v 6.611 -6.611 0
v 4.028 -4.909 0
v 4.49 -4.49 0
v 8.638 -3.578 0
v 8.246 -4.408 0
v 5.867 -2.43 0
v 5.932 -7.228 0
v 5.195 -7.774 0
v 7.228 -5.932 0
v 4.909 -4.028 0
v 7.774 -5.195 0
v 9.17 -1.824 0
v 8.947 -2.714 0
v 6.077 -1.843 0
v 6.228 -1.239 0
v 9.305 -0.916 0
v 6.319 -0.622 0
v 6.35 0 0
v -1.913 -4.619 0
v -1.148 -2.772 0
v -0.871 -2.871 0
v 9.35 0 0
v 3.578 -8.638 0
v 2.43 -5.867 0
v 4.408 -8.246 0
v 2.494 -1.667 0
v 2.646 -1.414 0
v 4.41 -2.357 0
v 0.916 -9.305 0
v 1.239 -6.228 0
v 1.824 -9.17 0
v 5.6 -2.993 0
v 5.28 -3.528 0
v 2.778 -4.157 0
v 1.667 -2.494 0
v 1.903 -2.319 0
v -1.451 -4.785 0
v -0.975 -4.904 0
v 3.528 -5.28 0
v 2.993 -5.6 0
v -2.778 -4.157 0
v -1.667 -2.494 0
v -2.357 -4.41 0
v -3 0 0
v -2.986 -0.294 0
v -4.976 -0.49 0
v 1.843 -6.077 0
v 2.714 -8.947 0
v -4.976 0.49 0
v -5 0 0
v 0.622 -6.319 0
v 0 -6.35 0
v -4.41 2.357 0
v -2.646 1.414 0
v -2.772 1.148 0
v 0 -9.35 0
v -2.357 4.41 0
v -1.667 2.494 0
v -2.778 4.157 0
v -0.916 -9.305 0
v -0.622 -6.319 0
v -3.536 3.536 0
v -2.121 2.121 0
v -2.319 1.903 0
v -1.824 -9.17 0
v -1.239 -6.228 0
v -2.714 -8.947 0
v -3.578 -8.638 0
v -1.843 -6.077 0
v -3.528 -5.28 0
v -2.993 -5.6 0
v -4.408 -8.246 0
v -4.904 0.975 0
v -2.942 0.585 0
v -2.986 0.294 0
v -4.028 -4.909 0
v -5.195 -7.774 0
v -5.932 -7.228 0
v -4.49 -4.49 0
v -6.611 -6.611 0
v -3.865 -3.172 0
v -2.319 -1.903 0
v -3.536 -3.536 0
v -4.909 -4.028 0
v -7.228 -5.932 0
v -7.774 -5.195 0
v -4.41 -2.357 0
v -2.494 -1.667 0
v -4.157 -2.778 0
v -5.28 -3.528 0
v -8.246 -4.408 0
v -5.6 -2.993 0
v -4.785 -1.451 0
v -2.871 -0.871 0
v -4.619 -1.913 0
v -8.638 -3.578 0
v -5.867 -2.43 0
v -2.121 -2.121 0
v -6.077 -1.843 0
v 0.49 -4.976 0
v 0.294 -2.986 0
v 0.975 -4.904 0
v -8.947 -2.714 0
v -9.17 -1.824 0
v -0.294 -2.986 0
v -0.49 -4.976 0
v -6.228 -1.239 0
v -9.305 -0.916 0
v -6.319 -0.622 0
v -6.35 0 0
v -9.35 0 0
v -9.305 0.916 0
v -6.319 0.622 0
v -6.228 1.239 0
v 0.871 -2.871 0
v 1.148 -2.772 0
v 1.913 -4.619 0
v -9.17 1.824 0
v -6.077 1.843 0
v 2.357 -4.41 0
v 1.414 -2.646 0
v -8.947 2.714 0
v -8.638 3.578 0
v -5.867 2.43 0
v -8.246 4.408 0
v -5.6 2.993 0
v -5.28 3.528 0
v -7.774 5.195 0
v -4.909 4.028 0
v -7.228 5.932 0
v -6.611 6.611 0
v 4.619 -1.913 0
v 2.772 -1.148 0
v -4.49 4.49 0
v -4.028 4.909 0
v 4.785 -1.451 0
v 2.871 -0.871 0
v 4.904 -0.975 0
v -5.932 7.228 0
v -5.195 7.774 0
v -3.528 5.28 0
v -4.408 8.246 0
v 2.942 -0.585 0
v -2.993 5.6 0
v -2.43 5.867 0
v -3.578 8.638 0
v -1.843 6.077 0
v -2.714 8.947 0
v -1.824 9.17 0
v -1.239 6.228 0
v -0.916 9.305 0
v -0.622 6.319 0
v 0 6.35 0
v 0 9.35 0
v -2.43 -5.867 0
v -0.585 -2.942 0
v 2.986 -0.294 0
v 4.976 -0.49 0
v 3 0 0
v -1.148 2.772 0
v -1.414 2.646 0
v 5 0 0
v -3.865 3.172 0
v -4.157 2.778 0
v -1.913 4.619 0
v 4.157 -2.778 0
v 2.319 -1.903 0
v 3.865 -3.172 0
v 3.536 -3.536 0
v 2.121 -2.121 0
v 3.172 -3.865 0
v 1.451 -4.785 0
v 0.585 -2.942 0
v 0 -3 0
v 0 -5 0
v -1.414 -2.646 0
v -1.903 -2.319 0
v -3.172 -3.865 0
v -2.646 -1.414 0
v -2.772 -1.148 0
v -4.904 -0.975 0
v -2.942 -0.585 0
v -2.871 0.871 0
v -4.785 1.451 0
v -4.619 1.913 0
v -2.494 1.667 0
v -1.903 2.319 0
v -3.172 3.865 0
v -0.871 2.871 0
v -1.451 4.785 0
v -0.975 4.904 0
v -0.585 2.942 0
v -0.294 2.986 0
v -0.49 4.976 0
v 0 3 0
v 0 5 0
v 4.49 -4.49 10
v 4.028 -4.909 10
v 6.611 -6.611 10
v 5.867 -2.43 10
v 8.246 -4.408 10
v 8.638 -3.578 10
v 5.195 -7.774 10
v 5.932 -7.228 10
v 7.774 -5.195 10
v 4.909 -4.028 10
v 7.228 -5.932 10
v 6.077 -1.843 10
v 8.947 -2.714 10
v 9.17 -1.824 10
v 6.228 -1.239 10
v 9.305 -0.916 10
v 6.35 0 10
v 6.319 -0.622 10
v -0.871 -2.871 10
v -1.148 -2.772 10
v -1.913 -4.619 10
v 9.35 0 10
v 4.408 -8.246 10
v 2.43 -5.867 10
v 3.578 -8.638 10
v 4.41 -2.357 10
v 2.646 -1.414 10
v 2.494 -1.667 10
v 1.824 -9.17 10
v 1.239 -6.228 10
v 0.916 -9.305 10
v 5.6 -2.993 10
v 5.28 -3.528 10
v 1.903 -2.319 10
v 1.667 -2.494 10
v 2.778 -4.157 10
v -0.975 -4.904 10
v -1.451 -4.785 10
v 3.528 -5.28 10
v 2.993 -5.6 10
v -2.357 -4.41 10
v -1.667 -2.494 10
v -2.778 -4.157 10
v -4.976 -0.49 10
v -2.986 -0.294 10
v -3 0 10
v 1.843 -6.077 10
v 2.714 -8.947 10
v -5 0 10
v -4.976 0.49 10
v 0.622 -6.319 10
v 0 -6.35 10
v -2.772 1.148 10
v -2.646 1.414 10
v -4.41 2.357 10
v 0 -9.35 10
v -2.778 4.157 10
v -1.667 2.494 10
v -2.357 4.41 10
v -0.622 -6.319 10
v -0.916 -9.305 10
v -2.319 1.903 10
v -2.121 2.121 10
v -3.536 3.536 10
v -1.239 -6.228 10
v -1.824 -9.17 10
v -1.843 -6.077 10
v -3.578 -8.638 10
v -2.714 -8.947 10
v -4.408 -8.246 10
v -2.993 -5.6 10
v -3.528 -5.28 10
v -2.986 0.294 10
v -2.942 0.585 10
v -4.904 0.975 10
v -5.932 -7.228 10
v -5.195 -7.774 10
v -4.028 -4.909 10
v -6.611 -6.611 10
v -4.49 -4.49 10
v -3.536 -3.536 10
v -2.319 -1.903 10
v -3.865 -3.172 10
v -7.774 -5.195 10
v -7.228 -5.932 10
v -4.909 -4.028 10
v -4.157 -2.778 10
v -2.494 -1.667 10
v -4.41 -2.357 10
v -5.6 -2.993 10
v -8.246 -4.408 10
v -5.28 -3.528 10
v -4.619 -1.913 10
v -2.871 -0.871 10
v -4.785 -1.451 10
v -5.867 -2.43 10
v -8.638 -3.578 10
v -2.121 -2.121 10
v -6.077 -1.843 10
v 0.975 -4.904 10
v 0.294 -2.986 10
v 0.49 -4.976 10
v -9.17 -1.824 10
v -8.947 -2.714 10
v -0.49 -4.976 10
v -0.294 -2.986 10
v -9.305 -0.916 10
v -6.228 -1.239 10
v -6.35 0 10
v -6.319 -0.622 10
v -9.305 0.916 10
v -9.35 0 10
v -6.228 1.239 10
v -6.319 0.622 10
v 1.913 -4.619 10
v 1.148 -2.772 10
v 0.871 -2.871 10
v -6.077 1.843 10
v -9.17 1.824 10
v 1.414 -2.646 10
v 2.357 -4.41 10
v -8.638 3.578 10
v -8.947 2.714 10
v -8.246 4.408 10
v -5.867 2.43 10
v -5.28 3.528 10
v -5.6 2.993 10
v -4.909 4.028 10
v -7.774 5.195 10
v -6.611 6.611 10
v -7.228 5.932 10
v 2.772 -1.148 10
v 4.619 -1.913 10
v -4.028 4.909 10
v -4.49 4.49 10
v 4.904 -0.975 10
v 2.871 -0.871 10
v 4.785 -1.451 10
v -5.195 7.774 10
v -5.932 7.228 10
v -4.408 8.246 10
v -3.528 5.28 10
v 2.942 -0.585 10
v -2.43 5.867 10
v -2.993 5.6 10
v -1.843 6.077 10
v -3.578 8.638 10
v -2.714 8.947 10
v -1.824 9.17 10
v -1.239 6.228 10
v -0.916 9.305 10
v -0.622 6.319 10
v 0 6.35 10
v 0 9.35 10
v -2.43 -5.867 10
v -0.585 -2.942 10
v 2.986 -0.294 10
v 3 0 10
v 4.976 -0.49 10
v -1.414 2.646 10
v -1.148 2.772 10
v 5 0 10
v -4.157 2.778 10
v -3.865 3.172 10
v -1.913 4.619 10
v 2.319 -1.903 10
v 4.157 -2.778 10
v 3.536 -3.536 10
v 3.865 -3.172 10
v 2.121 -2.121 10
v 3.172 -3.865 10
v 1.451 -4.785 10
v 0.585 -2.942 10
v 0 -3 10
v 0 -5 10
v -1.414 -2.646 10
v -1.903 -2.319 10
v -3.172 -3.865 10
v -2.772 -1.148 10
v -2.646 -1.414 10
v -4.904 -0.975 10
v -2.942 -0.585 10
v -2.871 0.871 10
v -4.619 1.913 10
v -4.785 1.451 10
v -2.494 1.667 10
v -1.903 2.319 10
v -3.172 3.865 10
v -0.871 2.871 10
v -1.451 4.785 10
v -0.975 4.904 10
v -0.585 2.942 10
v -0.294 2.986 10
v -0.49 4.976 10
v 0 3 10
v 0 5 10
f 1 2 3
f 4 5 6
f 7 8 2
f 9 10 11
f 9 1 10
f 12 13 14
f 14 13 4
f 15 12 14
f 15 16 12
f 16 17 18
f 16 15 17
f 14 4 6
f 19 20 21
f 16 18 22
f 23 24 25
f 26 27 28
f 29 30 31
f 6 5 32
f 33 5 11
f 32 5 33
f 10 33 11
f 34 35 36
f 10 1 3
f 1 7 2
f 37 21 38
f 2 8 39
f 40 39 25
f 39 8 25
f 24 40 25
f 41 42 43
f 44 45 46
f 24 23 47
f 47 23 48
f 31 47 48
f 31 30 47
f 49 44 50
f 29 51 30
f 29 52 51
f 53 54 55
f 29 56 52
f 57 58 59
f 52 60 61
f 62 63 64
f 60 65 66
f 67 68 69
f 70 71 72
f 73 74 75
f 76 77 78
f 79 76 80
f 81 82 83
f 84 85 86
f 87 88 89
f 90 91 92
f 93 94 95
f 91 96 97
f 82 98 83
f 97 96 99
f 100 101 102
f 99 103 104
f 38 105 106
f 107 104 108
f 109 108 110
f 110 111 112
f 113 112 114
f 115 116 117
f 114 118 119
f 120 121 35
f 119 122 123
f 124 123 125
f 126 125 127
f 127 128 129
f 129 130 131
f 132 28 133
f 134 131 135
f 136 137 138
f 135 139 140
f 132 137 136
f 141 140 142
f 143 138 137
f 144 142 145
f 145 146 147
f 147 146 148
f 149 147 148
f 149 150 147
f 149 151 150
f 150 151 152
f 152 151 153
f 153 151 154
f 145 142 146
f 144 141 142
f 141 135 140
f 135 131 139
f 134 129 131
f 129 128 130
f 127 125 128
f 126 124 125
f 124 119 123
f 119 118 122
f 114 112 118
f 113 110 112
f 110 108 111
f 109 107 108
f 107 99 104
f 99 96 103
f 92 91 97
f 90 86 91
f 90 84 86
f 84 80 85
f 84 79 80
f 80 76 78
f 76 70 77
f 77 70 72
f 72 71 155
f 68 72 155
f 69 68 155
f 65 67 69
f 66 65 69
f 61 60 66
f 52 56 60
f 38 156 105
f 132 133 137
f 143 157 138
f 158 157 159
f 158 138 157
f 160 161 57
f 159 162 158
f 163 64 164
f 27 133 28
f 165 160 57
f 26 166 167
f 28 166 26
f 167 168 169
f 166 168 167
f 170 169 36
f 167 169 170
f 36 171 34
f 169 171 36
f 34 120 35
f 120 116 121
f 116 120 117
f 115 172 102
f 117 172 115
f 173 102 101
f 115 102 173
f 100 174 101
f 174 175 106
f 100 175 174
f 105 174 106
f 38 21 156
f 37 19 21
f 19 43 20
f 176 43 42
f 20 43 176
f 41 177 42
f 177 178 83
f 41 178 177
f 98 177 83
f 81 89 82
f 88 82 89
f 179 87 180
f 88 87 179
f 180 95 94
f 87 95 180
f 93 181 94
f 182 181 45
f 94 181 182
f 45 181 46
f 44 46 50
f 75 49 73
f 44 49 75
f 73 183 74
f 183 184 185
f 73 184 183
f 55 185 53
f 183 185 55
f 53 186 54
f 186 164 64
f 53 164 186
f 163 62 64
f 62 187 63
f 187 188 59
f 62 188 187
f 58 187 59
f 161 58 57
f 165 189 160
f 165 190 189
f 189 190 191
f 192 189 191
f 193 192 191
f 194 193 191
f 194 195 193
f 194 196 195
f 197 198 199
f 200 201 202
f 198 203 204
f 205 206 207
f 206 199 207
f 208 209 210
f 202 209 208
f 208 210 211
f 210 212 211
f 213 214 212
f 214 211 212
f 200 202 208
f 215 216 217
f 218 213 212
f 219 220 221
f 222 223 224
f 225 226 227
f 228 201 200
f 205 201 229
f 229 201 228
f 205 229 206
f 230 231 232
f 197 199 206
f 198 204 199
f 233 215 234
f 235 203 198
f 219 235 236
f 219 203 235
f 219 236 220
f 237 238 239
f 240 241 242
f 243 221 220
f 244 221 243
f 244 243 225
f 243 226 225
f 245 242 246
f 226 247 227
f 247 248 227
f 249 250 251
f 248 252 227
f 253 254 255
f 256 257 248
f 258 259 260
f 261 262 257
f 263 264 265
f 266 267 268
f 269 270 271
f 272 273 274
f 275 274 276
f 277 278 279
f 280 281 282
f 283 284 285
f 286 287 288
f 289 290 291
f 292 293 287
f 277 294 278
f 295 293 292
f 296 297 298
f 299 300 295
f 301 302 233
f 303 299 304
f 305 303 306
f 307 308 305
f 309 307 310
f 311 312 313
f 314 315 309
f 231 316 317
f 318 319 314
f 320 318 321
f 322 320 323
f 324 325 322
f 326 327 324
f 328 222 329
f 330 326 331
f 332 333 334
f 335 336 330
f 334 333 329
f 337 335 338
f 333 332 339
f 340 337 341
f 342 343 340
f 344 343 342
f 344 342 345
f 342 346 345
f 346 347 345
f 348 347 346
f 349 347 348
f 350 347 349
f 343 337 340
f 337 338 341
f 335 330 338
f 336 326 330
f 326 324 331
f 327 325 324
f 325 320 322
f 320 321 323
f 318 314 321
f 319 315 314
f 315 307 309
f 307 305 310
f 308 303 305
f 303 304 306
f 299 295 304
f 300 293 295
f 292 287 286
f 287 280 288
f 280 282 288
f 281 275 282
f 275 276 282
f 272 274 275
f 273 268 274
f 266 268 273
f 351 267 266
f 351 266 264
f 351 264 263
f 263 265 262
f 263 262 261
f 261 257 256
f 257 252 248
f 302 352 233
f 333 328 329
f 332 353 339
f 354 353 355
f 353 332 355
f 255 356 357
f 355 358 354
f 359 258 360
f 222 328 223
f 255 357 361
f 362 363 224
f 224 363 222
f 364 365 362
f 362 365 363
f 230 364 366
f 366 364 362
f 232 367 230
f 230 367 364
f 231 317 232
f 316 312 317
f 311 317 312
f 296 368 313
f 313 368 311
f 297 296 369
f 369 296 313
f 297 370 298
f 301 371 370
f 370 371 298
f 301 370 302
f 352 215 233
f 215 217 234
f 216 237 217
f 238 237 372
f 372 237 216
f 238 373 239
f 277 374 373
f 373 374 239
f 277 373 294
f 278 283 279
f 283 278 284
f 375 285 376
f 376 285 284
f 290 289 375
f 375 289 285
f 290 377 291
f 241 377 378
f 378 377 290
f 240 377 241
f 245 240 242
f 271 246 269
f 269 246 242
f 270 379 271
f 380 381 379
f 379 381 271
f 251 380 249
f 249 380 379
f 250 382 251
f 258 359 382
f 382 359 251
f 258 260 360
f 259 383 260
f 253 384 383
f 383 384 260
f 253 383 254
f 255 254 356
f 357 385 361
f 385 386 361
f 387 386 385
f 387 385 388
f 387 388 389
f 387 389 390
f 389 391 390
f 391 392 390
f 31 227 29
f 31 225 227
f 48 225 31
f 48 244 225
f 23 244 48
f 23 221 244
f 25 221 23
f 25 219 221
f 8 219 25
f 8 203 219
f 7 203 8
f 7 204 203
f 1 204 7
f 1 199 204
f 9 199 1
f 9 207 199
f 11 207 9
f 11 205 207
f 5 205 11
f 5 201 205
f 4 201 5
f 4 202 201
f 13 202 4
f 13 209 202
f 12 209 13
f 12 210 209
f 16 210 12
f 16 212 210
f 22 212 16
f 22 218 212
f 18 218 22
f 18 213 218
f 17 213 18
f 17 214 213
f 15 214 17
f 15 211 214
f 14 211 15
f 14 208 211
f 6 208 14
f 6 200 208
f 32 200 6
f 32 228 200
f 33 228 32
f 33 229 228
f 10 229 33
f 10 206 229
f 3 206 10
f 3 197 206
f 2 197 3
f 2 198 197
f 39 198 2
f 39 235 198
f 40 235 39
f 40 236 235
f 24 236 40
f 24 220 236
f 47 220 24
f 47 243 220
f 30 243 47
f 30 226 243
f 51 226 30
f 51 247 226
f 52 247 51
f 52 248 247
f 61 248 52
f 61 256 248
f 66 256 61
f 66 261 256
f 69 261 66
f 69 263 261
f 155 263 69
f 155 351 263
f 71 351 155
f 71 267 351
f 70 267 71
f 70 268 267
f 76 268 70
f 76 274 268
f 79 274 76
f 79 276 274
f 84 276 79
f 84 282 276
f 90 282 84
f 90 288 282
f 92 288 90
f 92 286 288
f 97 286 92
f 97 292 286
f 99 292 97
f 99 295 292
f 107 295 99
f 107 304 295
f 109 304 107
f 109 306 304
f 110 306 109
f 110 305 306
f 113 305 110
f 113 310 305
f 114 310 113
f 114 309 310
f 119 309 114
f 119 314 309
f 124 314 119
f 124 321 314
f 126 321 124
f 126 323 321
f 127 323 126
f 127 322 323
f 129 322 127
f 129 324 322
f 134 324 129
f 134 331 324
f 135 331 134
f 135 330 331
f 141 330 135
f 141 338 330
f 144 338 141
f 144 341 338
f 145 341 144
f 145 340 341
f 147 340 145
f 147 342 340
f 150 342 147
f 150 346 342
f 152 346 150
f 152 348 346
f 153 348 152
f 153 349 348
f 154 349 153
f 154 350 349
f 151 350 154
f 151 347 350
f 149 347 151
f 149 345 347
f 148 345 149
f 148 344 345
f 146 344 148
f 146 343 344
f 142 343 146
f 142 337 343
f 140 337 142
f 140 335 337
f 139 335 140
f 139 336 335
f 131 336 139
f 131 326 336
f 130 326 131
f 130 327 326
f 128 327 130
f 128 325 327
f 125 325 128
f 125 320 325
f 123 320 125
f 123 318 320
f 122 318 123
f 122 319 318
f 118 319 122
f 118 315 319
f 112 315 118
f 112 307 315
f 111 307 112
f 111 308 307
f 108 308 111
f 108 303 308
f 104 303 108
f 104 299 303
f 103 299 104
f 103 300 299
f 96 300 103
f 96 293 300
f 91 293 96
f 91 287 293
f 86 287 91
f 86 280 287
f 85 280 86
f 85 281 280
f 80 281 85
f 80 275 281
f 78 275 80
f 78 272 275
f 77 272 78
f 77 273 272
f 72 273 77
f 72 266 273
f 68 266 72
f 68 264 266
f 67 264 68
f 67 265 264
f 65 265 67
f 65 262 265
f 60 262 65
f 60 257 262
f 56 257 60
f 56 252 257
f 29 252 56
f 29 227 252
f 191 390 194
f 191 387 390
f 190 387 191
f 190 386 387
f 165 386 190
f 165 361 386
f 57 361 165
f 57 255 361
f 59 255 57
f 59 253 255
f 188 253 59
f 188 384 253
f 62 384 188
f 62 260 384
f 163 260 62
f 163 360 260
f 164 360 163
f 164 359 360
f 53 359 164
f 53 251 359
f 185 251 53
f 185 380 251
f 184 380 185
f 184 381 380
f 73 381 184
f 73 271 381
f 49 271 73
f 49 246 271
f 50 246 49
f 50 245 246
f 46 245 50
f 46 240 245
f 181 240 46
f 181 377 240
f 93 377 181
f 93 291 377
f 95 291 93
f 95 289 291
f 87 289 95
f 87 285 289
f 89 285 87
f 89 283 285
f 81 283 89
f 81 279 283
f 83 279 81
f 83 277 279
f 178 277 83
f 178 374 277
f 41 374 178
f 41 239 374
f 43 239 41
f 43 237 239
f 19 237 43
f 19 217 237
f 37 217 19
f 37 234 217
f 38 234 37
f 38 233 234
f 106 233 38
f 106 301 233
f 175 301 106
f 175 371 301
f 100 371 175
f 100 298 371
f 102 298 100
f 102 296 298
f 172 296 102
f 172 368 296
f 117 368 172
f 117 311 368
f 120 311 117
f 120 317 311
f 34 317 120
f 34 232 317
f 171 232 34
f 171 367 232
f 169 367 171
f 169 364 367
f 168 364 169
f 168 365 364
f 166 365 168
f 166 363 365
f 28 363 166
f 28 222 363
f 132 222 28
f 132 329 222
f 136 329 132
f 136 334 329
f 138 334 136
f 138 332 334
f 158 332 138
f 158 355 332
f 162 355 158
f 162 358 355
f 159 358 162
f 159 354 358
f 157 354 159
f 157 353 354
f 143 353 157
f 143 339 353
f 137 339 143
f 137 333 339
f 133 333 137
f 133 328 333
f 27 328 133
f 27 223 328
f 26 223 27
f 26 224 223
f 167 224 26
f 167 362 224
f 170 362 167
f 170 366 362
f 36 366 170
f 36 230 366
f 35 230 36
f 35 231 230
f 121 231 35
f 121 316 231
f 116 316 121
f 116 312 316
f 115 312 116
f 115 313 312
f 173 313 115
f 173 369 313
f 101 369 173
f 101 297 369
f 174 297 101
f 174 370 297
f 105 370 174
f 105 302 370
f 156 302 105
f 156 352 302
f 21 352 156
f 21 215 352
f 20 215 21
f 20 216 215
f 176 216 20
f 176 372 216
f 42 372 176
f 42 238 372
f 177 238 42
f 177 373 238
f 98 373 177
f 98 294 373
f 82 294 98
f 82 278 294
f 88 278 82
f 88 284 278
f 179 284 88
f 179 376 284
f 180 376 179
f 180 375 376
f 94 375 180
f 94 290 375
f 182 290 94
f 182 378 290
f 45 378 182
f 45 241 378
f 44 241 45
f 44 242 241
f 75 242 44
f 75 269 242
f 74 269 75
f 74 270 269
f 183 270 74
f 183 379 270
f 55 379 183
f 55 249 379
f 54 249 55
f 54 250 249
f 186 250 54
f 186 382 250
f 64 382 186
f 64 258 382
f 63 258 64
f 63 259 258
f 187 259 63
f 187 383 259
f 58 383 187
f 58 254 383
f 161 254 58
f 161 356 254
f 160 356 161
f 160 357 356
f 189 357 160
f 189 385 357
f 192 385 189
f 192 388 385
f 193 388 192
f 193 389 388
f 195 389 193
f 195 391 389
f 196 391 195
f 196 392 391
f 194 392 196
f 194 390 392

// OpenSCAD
// Dimensions for the snap-on clip
// Rod specifications
rod_id = 12.7; // Inner diameter of the rod ring (1/2 inch)
rod_wall = 3;   // Wall thickness of the rod ring
rod_od = rod_id + 2 * rod_wall; // Outer diameter of the rod ring (18.7 mm)
rod_center_x = 0; // X position of the rod ring center
rod_center_y = 0; // Y position of the rod ring center

// Tubing specifications
tubing_id = 6; // Inner diameter of the tubing ring
tubing_wall = 2; // Wall thickness of the tubing ring
tubing_od = tubing_id + 2 * tubing_wall; // Outer diameter of the tubing ring (10 mm)
tubing_center_x = 15; // X position of the tubing ring center
tubing_center_y = 0; // Y position of the tubing ring center

// Bridge specifications
bridge_x1 = 8; // Left X coordinate of the bridge
bridge_x2 = 12; // Right X coordinate of the bridge
bridge_width_y = 6; // Width of the bridge in Y direction

// Opening specifications
rod_opening_y_half = 5; // Half-width of the opening on the rod ring
tubing_opening_y_half = 2.25; // Half-width of the opening on the tubing ring

// Print orientation
print_height = 10; // Height of the extrusion in Z direction

// $fn for curved shapes to ensure roundness
$fn = 64;

// Main part construction - 2D profile extruded to 3D
linear_extrude(height = print_height) {
    difference() {
        // Union of all 2D shapes
        union() {
            // 1. Rod Ring (2D) - centered at origin
            difference() {
                circle(r = rod_od / 2);
                circle(r = rod_id / 2);
            }
            translate([rod_center_x, rod_center_y]);
            
            // 2. Tubing Ring (2D) - centered at x = 15, y = 0
            difference() {
                circle(r = tubing_od / 2);
                circle(r = tubing_id / 2);
            }
            translate([tubing_center_x, tubing_center_y]);
            
            // 3. Solid Bridge (2D) - between x = 8 and x = 12
            square([bridge_x2 - bridge_x1, bridge_width_y]);
            translate([bridge_x1 + (bridge_x2 - bridge_x1) / 2, 0]);
        }
        
        // Cutout 1: -X side of rod ring (x < 0, -5 < y < 5)
        // Box extends past the ring face to satisfy Rule 5
        square([20, rod_opening_y_half * 2]);
        translate([-10, 0]);
        
        // Cutout 2: +X side of tubing ring (x > 15, -2.25 < y < 2.25)
        // Box extends past the ring face to satisfy Rule 5
        square([10, tubing_opening_y_half * 2]);
        translate([tubing_center_x + 5, 0]);
    }
}
